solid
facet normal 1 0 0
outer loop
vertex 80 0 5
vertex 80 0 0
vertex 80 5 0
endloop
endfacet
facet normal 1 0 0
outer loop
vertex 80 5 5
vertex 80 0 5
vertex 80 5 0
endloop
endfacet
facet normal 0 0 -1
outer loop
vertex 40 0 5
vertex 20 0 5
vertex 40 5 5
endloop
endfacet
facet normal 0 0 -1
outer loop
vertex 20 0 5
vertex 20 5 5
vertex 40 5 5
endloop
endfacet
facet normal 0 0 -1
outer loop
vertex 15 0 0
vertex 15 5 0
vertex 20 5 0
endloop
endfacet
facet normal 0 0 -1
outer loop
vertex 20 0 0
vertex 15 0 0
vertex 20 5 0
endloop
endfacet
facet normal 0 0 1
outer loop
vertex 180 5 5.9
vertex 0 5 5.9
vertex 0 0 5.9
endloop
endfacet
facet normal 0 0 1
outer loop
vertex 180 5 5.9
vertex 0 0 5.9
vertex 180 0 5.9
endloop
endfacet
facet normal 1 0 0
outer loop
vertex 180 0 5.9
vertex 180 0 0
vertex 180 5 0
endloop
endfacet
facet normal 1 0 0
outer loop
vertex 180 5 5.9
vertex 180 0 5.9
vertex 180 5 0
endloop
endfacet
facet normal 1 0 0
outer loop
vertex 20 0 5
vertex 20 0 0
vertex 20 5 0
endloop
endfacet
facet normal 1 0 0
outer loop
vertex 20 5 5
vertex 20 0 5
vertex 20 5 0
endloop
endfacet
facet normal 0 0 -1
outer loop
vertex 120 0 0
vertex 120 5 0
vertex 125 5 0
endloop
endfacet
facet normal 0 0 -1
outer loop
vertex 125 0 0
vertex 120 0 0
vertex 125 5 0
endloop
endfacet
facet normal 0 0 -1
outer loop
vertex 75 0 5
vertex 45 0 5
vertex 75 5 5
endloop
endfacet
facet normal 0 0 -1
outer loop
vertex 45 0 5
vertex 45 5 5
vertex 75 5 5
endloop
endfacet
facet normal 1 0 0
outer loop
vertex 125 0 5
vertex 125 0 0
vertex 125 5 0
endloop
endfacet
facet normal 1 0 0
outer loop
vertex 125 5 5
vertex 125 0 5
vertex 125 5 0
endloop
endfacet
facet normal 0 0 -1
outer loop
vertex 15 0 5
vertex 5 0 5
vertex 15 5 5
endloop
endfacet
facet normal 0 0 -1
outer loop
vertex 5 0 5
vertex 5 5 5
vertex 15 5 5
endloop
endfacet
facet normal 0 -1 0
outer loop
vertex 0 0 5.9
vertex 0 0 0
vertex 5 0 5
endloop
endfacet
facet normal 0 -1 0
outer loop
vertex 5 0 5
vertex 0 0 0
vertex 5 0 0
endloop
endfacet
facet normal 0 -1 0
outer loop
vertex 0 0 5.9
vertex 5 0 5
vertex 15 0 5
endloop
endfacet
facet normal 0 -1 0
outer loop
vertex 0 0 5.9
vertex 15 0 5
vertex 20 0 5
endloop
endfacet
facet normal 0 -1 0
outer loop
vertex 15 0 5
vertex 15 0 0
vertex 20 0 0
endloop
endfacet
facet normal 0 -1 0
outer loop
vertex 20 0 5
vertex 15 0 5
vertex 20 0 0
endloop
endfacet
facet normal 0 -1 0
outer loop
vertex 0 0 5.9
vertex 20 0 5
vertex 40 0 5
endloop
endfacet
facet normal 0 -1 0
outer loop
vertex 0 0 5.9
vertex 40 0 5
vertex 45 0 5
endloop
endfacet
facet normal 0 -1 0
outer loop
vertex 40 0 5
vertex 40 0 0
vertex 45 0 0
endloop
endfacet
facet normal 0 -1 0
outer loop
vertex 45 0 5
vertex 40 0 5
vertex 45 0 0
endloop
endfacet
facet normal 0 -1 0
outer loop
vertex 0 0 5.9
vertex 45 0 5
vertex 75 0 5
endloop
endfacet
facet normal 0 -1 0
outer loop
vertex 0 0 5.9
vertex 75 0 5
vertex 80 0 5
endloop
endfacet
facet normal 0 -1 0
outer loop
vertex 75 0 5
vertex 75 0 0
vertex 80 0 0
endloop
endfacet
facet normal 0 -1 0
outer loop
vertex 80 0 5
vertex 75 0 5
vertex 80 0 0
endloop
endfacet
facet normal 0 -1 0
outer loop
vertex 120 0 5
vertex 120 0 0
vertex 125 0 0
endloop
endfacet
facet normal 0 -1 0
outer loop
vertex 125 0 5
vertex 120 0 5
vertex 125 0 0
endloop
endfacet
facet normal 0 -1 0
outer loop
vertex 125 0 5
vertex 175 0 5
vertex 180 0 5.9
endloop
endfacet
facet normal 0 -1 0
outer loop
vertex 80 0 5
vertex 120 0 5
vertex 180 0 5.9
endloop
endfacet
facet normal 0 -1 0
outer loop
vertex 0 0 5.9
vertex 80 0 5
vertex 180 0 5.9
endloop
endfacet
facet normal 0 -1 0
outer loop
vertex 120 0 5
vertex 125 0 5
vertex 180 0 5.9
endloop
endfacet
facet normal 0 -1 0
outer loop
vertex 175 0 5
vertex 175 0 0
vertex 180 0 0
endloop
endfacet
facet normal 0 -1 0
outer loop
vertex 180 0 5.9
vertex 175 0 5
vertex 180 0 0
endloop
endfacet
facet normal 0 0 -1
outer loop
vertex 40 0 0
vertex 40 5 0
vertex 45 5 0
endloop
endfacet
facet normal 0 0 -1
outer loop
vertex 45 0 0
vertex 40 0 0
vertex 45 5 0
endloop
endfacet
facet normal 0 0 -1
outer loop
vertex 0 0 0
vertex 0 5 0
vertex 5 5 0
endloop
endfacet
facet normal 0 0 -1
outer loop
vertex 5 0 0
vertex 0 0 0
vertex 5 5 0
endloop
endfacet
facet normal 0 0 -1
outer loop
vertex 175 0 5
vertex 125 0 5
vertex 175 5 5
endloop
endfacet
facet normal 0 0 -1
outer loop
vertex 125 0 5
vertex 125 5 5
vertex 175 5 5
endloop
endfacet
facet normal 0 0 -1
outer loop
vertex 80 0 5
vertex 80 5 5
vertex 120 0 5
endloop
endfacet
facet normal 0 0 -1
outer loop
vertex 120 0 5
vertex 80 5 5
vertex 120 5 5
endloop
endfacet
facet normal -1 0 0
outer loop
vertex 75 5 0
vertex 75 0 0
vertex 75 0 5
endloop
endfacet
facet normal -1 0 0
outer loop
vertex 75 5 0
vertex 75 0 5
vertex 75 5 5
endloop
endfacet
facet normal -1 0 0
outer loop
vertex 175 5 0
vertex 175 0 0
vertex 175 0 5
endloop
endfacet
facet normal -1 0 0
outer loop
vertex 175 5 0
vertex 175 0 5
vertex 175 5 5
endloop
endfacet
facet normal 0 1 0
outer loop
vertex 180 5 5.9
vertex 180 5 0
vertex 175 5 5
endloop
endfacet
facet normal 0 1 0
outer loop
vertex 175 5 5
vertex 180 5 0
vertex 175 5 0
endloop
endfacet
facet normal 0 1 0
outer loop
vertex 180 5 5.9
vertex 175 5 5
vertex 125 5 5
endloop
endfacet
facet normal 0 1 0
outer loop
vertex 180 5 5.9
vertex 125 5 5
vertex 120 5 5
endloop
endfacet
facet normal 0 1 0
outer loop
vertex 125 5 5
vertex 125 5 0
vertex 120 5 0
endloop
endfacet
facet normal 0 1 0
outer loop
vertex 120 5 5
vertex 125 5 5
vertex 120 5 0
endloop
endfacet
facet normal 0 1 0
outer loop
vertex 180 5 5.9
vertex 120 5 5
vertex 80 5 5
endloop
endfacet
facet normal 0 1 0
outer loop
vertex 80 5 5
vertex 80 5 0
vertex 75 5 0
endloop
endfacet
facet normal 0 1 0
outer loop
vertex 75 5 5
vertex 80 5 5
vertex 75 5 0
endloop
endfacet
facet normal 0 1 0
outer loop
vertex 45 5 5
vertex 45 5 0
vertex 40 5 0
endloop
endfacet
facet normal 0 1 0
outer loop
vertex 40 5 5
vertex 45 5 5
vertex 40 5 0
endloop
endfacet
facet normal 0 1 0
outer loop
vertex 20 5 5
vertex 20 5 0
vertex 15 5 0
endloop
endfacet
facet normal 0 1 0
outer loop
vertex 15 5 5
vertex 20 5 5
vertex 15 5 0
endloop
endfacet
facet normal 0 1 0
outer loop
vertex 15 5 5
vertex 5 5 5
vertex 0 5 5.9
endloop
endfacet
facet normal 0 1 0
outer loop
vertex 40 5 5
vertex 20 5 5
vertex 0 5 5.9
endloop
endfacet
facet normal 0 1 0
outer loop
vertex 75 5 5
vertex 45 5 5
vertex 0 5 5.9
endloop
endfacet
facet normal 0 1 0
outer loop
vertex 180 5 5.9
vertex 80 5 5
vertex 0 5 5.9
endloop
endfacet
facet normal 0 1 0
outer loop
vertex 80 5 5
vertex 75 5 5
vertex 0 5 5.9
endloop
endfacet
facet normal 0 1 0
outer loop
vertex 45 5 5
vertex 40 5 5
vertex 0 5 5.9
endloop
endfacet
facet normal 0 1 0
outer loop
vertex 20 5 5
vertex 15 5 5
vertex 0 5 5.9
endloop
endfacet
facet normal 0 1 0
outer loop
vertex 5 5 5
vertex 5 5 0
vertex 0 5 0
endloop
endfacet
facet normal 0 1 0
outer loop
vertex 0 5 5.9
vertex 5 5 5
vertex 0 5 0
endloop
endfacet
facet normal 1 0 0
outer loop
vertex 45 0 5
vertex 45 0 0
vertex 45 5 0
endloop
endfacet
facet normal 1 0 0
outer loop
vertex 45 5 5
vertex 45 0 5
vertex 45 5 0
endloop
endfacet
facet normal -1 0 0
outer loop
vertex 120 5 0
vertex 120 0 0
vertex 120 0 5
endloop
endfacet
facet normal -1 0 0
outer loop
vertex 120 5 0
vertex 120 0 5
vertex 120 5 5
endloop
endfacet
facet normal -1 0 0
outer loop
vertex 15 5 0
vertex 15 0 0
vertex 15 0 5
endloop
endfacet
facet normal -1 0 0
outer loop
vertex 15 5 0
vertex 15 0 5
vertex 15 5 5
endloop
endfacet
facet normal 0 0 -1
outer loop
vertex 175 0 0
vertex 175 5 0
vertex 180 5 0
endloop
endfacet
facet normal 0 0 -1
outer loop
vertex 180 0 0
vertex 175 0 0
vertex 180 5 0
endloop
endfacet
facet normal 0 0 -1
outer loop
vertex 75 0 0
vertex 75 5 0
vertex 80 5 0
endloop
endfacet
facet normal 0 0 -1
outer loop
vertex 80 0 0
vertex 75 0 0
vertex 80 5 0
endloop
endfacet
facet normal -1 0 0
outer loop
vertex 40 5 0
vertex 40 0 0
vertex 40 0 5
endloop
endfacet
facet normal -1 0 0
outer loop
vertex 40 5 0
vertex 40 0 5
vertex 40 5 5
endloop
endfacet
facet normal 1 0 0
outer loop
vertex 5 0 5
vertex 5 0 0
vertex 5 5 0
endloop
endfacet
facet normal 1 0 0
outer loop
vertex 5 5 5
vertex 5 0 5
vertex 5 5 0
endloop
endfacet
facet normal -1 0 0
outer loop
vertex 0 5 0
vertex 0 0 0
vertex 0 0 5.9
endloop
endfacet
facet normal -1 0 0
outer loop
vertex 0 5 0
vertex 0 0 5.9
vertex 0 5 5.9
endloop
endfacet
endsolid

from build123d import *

# Parameters (mm, degrees)
F0_W     = 5
F0_H     = 5
F1_DEPTH = 5
F7_W     = 175
F7_H     = 5
F7_W_2   = 5
F8_DEPTH = 0.9


with BuildPart() as f1:
    # F0 (on Top) → F1 (new body)
    with BuildSketch(Plane.XY):
        with Locations((2.5, 2.5)):
            Rectangle(F0_W, F0_H)
    extrude(amount=F1_DEPTH)



with BuildPart() as f2_1:
    # F2: copy of F1
    add(f1.part.moved(Location((15, 0, 0))))


with BuildPart() as f3_1:
    # F3: copy of F2_1
    add(f2_1.part.moved(Location((25, 0, 0))))


with BuildPart() as f4_1:
    # F4: copy of F3_1
    add(f3_1.part.moved(Location((35, 0, 0))))


with BuildPart() as f5_1:
    # F5: copy of F4_1
    add(f4_1.part.moved(Location((45, 0, 0))))


with BuildPart() as f6_1:
    # F6: copy of F5_1
    add(f5_1.part.moved(Location((55, 0, 0))))


with BuildPart() as f1_1:
    add(f1.part)

    add(f2_1.part)  # F8 merges F2_1

    add(f3_1.part)  # F8 merges F3_1

    add(f4_1.part)  # F8 merges F4_1

    add(f5_1.part)  # F8 merges F5_1

    add(f6_1.part)  # F8 merges F6_1
    # F7 (on face) → F8 (join)
    with BuildSketch(Plane.XY.offset(5)):
        with Locations((92.5, 2.5)):
            Rectangle(F7_W, F7_H)
        with Locations((2.5, 2.5)):
            Rectangle(F7_W_2, F7_H)
    extrude(amount=F8_DEPTH)


solid = f1_1.part
